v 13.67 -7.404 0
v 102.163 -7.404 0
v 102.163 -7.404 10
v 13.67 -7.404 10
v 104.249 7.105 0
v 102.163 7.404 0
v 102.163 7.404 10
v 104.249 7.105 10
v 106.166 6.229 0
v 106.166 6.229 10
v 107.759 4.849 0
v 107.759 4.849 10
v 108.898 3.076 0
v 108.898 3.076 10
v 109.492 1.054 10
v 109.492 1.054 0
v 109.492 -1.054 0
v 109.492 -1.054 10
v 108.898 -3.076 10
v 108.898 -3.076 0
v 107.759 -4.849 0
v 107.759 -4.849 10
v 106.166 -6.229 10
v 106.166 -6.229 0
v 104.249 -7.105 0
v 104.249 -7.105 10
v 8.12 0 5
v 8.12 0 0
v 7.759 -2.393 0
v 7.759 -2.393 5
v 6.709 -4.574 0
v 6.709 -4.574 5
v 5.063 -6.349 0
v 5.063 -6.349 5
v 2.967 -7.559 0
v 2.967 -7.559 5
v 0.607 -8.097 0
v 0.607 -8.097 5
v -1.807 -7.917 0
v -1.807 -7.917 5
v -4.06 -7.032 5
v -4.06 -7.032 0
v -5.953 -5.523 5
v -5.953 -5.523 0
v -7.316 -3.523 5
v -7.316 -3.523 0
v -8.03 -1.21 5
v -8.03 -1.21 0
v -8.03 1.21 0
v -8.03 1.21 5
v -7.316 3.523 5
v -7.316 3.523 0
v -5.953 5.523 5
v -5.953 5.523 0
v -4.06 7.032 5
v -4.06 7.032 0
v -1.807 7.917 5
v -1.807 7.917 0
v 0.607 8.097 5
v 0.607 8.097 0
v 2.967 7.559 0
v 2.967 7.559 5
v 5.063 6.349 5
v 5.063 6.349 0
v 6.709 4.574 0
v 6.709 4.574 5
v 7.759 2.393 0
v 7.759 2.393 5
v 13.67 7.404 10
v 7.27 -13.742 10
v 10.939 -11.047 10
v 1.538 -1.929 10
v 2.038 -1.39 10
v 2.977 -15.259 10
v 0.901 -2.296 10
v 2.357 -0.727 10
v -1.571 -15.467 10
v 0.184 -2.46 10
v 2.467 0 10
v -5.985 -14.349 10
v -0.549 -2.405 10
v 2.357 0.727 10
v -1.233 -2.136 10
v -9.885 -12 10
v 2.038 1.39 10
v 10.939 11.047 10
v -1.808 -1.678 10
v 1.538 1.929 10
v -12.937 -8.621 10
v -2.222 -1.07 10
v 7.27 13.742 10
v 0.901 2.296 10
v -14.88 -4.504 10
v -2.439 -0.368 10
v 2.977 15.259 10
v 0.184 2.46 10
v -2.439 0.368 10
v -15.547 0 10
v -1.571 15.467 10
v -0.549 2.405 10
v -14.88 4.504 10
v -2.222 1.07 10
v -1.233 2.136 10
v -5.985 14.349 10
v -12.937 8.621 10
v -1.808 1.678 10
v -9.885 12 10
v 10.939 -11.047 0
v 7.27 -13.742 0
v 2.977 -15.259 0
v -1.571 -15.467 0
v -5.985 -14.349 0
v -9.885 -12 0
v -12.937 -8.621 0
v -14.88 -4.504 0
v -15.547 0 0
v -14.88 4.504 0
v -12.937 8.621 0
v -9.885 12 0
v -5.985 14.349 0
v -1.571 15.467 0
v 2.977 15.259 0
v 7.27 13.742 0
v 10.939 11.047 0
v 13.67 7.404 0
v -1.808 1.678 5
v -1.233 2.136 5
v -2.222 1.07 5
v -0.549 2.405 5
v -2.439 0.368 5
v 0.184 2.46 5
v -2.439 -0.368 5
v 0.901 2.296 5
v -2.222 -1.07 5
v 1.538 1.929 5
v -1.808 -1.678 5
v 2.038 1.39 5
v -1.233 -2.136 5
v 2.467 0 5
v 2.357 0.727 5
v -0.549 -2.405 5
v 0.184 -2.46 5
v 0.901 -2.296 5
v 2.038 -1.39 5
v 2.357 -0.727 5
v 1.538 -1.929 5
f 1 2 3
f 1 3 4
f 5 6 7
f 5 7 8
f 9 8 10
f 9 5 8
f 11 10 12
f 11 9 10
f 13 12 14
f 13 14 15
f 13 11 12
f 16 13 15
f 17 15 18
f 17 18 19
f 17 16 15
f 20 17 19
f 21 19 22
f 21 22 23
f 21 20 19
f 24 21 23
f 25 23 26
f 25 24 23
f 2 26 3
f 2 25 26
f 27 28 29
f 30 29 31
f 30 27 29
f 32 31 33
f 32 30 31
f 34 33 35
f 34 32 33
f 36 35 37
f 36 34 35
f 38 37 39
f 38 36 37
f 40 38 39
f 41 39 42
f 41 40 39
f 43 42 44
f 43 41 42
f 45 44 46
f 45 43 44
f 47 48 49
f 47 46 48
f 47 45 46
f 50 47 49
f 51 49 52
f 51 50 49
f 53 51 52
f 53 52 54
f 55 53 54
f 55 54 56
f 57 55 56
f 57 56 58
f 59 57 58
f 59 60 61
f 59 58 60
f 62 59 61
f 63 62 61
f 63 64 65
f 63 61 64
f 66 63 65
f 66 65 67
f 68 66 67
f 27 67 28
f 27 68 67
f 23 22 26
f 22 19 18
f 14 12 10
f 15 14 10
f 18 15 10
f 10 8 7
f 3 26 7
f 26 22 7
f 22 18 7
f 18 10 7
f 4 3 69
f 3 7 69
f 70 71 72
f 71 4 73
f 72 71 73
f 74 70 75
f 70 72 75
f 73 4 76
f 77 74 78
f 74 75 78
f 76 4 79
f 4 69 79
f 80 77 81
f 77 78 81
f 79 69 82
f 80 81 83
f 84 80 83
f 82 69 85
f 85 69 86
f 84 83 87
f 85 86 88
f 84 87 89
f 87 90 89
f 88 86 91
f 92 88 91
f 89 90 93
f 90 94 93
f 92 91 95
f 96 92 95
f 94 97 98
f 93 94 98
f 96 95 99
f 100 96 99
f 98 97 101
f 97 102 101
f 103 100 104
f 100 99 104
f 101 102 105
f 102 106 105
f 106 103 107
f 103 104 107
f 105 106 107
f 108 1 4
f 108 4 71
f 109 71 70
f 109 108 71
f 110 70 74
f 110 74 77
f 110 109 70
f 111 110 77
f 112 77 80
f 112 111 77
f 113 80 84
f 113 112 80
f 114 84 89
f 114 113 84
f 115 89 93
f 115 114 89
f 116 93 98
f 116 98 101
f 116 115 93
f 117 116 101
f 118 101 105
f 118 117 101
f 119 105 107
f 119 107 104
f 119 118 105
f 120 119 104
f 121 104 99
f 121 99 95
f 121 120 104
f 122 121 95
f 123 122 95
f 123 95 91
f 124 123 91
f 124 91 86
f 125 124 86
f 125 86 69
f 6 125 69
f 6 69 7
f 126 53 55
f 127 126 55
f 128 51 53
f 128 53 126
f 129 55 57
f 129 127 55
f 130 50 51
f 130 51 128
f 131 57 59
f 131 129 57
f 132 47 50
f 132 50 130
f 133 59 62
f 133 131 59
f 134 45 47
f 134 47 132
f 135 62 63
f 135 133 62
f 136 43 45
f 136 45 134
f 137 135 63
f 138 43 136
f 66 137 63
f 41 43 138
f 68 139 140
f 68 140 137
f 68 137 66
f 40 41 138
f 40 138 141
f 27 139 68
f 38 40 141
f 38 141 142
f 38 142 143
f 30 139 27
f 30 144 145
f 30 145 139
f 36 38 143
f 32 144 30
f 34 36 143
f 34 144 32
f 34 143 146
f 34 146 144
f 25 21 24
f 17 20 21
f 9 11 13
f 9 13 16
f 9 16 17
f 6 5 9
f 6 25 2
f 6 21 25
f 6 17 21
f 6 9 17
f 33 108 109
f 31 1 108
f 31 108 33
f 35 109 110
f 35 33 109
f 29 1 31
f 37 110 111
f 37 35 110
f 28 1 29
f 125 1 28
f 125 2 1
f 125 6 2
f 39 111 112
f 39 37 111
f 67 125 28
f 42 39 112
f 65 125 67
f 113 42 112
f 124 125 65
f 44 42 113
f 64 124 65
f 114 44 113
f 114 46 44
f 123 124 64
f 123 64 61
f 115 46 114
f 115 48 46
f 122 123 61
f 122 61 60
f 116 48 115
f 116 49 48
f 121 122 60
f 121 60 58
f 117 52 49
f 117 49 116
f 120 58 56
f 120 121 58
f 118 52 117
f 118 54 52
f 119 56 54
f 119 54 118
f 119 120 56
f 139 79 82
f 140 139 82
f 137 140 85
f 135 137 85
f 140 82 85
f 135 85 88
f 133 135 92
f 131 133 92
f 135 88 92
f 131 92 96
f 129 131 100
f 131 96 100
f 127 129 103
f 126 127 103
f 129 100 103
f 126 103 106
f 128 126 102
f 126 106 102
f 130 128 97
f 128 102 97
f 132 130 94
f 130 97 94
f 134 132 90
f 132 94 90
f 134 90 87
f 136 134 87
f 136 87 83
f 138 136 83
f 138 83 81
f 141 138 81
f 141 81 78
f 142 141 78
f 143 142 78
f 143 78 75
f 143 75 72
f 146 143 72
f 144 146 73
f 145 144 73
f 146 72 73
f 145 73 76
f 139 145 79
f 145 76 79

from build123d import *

# Parameters (mm, degrees)
EXTRUDE_1_DEPTH          = 10
CUT_EXTRUDE_1_DEPTH      = 112.11599651
CUT_EXTRUDE_1_DEPTH_BACK = 5
SKETCH_2_R               = 8.120196397
SKETCH_3_R               = 2.466762855
CUT_EXTRUDE_2_DEPTH      = 5


with BuildPart() as part:
    # 草图1 → 凸台-拉伸1 (new body)
    with BuildSketch(Plane.XY):
        with BuildLine():
            Line((13.670219887, 7.404471095), (102.163149927, 7.404471095))
            ThreePointArc((102.163149927, 7.404471095), (109.567621023, 0), (102.163149927, -7.404471095))
            Line((102.163149927, -7.404471095), (13.670219887, -7.404471095))
            ThreePointArc((13.670219887, -7.404471095), (-15.546739336, 0), (13.670219887, 7.404471095))
        make_face()
    extrude(amount=EXTRUDE_1_DEPTH)

    # 草图2 → 切除-拉伸1 (cut, two sides: drawn at the far end of the back side and taken through both)
    with BuildSketch(Plane(origin=(0, 0, 0), x_dir=(-1, 0, 0), z_dir=(0, 0, -1)).offset(-CUT_EXTRUDE_1_DEPTH_BACK)):
        with Locations(Location((0, 0, 0), (0, 0, 180))):
            Circle(SKETCH_2_R)
    extrude(amount=CUT_EXTRUDE_1_DEPTH + CUT_EXTRUDE_1_DEPTH_BACK, mode=Mode.SUBTRACT)

    # 草图3 → 切除-拉伸2 (cut)
    with BuildSketch(Plane.XY.offset(10)):
        Circle(SKETCH_3_R)
    extrude(amount=-CUT_EXTRUDE_2_DEPTH, mode=Mode.SUBTRACT)


solid = part.part
